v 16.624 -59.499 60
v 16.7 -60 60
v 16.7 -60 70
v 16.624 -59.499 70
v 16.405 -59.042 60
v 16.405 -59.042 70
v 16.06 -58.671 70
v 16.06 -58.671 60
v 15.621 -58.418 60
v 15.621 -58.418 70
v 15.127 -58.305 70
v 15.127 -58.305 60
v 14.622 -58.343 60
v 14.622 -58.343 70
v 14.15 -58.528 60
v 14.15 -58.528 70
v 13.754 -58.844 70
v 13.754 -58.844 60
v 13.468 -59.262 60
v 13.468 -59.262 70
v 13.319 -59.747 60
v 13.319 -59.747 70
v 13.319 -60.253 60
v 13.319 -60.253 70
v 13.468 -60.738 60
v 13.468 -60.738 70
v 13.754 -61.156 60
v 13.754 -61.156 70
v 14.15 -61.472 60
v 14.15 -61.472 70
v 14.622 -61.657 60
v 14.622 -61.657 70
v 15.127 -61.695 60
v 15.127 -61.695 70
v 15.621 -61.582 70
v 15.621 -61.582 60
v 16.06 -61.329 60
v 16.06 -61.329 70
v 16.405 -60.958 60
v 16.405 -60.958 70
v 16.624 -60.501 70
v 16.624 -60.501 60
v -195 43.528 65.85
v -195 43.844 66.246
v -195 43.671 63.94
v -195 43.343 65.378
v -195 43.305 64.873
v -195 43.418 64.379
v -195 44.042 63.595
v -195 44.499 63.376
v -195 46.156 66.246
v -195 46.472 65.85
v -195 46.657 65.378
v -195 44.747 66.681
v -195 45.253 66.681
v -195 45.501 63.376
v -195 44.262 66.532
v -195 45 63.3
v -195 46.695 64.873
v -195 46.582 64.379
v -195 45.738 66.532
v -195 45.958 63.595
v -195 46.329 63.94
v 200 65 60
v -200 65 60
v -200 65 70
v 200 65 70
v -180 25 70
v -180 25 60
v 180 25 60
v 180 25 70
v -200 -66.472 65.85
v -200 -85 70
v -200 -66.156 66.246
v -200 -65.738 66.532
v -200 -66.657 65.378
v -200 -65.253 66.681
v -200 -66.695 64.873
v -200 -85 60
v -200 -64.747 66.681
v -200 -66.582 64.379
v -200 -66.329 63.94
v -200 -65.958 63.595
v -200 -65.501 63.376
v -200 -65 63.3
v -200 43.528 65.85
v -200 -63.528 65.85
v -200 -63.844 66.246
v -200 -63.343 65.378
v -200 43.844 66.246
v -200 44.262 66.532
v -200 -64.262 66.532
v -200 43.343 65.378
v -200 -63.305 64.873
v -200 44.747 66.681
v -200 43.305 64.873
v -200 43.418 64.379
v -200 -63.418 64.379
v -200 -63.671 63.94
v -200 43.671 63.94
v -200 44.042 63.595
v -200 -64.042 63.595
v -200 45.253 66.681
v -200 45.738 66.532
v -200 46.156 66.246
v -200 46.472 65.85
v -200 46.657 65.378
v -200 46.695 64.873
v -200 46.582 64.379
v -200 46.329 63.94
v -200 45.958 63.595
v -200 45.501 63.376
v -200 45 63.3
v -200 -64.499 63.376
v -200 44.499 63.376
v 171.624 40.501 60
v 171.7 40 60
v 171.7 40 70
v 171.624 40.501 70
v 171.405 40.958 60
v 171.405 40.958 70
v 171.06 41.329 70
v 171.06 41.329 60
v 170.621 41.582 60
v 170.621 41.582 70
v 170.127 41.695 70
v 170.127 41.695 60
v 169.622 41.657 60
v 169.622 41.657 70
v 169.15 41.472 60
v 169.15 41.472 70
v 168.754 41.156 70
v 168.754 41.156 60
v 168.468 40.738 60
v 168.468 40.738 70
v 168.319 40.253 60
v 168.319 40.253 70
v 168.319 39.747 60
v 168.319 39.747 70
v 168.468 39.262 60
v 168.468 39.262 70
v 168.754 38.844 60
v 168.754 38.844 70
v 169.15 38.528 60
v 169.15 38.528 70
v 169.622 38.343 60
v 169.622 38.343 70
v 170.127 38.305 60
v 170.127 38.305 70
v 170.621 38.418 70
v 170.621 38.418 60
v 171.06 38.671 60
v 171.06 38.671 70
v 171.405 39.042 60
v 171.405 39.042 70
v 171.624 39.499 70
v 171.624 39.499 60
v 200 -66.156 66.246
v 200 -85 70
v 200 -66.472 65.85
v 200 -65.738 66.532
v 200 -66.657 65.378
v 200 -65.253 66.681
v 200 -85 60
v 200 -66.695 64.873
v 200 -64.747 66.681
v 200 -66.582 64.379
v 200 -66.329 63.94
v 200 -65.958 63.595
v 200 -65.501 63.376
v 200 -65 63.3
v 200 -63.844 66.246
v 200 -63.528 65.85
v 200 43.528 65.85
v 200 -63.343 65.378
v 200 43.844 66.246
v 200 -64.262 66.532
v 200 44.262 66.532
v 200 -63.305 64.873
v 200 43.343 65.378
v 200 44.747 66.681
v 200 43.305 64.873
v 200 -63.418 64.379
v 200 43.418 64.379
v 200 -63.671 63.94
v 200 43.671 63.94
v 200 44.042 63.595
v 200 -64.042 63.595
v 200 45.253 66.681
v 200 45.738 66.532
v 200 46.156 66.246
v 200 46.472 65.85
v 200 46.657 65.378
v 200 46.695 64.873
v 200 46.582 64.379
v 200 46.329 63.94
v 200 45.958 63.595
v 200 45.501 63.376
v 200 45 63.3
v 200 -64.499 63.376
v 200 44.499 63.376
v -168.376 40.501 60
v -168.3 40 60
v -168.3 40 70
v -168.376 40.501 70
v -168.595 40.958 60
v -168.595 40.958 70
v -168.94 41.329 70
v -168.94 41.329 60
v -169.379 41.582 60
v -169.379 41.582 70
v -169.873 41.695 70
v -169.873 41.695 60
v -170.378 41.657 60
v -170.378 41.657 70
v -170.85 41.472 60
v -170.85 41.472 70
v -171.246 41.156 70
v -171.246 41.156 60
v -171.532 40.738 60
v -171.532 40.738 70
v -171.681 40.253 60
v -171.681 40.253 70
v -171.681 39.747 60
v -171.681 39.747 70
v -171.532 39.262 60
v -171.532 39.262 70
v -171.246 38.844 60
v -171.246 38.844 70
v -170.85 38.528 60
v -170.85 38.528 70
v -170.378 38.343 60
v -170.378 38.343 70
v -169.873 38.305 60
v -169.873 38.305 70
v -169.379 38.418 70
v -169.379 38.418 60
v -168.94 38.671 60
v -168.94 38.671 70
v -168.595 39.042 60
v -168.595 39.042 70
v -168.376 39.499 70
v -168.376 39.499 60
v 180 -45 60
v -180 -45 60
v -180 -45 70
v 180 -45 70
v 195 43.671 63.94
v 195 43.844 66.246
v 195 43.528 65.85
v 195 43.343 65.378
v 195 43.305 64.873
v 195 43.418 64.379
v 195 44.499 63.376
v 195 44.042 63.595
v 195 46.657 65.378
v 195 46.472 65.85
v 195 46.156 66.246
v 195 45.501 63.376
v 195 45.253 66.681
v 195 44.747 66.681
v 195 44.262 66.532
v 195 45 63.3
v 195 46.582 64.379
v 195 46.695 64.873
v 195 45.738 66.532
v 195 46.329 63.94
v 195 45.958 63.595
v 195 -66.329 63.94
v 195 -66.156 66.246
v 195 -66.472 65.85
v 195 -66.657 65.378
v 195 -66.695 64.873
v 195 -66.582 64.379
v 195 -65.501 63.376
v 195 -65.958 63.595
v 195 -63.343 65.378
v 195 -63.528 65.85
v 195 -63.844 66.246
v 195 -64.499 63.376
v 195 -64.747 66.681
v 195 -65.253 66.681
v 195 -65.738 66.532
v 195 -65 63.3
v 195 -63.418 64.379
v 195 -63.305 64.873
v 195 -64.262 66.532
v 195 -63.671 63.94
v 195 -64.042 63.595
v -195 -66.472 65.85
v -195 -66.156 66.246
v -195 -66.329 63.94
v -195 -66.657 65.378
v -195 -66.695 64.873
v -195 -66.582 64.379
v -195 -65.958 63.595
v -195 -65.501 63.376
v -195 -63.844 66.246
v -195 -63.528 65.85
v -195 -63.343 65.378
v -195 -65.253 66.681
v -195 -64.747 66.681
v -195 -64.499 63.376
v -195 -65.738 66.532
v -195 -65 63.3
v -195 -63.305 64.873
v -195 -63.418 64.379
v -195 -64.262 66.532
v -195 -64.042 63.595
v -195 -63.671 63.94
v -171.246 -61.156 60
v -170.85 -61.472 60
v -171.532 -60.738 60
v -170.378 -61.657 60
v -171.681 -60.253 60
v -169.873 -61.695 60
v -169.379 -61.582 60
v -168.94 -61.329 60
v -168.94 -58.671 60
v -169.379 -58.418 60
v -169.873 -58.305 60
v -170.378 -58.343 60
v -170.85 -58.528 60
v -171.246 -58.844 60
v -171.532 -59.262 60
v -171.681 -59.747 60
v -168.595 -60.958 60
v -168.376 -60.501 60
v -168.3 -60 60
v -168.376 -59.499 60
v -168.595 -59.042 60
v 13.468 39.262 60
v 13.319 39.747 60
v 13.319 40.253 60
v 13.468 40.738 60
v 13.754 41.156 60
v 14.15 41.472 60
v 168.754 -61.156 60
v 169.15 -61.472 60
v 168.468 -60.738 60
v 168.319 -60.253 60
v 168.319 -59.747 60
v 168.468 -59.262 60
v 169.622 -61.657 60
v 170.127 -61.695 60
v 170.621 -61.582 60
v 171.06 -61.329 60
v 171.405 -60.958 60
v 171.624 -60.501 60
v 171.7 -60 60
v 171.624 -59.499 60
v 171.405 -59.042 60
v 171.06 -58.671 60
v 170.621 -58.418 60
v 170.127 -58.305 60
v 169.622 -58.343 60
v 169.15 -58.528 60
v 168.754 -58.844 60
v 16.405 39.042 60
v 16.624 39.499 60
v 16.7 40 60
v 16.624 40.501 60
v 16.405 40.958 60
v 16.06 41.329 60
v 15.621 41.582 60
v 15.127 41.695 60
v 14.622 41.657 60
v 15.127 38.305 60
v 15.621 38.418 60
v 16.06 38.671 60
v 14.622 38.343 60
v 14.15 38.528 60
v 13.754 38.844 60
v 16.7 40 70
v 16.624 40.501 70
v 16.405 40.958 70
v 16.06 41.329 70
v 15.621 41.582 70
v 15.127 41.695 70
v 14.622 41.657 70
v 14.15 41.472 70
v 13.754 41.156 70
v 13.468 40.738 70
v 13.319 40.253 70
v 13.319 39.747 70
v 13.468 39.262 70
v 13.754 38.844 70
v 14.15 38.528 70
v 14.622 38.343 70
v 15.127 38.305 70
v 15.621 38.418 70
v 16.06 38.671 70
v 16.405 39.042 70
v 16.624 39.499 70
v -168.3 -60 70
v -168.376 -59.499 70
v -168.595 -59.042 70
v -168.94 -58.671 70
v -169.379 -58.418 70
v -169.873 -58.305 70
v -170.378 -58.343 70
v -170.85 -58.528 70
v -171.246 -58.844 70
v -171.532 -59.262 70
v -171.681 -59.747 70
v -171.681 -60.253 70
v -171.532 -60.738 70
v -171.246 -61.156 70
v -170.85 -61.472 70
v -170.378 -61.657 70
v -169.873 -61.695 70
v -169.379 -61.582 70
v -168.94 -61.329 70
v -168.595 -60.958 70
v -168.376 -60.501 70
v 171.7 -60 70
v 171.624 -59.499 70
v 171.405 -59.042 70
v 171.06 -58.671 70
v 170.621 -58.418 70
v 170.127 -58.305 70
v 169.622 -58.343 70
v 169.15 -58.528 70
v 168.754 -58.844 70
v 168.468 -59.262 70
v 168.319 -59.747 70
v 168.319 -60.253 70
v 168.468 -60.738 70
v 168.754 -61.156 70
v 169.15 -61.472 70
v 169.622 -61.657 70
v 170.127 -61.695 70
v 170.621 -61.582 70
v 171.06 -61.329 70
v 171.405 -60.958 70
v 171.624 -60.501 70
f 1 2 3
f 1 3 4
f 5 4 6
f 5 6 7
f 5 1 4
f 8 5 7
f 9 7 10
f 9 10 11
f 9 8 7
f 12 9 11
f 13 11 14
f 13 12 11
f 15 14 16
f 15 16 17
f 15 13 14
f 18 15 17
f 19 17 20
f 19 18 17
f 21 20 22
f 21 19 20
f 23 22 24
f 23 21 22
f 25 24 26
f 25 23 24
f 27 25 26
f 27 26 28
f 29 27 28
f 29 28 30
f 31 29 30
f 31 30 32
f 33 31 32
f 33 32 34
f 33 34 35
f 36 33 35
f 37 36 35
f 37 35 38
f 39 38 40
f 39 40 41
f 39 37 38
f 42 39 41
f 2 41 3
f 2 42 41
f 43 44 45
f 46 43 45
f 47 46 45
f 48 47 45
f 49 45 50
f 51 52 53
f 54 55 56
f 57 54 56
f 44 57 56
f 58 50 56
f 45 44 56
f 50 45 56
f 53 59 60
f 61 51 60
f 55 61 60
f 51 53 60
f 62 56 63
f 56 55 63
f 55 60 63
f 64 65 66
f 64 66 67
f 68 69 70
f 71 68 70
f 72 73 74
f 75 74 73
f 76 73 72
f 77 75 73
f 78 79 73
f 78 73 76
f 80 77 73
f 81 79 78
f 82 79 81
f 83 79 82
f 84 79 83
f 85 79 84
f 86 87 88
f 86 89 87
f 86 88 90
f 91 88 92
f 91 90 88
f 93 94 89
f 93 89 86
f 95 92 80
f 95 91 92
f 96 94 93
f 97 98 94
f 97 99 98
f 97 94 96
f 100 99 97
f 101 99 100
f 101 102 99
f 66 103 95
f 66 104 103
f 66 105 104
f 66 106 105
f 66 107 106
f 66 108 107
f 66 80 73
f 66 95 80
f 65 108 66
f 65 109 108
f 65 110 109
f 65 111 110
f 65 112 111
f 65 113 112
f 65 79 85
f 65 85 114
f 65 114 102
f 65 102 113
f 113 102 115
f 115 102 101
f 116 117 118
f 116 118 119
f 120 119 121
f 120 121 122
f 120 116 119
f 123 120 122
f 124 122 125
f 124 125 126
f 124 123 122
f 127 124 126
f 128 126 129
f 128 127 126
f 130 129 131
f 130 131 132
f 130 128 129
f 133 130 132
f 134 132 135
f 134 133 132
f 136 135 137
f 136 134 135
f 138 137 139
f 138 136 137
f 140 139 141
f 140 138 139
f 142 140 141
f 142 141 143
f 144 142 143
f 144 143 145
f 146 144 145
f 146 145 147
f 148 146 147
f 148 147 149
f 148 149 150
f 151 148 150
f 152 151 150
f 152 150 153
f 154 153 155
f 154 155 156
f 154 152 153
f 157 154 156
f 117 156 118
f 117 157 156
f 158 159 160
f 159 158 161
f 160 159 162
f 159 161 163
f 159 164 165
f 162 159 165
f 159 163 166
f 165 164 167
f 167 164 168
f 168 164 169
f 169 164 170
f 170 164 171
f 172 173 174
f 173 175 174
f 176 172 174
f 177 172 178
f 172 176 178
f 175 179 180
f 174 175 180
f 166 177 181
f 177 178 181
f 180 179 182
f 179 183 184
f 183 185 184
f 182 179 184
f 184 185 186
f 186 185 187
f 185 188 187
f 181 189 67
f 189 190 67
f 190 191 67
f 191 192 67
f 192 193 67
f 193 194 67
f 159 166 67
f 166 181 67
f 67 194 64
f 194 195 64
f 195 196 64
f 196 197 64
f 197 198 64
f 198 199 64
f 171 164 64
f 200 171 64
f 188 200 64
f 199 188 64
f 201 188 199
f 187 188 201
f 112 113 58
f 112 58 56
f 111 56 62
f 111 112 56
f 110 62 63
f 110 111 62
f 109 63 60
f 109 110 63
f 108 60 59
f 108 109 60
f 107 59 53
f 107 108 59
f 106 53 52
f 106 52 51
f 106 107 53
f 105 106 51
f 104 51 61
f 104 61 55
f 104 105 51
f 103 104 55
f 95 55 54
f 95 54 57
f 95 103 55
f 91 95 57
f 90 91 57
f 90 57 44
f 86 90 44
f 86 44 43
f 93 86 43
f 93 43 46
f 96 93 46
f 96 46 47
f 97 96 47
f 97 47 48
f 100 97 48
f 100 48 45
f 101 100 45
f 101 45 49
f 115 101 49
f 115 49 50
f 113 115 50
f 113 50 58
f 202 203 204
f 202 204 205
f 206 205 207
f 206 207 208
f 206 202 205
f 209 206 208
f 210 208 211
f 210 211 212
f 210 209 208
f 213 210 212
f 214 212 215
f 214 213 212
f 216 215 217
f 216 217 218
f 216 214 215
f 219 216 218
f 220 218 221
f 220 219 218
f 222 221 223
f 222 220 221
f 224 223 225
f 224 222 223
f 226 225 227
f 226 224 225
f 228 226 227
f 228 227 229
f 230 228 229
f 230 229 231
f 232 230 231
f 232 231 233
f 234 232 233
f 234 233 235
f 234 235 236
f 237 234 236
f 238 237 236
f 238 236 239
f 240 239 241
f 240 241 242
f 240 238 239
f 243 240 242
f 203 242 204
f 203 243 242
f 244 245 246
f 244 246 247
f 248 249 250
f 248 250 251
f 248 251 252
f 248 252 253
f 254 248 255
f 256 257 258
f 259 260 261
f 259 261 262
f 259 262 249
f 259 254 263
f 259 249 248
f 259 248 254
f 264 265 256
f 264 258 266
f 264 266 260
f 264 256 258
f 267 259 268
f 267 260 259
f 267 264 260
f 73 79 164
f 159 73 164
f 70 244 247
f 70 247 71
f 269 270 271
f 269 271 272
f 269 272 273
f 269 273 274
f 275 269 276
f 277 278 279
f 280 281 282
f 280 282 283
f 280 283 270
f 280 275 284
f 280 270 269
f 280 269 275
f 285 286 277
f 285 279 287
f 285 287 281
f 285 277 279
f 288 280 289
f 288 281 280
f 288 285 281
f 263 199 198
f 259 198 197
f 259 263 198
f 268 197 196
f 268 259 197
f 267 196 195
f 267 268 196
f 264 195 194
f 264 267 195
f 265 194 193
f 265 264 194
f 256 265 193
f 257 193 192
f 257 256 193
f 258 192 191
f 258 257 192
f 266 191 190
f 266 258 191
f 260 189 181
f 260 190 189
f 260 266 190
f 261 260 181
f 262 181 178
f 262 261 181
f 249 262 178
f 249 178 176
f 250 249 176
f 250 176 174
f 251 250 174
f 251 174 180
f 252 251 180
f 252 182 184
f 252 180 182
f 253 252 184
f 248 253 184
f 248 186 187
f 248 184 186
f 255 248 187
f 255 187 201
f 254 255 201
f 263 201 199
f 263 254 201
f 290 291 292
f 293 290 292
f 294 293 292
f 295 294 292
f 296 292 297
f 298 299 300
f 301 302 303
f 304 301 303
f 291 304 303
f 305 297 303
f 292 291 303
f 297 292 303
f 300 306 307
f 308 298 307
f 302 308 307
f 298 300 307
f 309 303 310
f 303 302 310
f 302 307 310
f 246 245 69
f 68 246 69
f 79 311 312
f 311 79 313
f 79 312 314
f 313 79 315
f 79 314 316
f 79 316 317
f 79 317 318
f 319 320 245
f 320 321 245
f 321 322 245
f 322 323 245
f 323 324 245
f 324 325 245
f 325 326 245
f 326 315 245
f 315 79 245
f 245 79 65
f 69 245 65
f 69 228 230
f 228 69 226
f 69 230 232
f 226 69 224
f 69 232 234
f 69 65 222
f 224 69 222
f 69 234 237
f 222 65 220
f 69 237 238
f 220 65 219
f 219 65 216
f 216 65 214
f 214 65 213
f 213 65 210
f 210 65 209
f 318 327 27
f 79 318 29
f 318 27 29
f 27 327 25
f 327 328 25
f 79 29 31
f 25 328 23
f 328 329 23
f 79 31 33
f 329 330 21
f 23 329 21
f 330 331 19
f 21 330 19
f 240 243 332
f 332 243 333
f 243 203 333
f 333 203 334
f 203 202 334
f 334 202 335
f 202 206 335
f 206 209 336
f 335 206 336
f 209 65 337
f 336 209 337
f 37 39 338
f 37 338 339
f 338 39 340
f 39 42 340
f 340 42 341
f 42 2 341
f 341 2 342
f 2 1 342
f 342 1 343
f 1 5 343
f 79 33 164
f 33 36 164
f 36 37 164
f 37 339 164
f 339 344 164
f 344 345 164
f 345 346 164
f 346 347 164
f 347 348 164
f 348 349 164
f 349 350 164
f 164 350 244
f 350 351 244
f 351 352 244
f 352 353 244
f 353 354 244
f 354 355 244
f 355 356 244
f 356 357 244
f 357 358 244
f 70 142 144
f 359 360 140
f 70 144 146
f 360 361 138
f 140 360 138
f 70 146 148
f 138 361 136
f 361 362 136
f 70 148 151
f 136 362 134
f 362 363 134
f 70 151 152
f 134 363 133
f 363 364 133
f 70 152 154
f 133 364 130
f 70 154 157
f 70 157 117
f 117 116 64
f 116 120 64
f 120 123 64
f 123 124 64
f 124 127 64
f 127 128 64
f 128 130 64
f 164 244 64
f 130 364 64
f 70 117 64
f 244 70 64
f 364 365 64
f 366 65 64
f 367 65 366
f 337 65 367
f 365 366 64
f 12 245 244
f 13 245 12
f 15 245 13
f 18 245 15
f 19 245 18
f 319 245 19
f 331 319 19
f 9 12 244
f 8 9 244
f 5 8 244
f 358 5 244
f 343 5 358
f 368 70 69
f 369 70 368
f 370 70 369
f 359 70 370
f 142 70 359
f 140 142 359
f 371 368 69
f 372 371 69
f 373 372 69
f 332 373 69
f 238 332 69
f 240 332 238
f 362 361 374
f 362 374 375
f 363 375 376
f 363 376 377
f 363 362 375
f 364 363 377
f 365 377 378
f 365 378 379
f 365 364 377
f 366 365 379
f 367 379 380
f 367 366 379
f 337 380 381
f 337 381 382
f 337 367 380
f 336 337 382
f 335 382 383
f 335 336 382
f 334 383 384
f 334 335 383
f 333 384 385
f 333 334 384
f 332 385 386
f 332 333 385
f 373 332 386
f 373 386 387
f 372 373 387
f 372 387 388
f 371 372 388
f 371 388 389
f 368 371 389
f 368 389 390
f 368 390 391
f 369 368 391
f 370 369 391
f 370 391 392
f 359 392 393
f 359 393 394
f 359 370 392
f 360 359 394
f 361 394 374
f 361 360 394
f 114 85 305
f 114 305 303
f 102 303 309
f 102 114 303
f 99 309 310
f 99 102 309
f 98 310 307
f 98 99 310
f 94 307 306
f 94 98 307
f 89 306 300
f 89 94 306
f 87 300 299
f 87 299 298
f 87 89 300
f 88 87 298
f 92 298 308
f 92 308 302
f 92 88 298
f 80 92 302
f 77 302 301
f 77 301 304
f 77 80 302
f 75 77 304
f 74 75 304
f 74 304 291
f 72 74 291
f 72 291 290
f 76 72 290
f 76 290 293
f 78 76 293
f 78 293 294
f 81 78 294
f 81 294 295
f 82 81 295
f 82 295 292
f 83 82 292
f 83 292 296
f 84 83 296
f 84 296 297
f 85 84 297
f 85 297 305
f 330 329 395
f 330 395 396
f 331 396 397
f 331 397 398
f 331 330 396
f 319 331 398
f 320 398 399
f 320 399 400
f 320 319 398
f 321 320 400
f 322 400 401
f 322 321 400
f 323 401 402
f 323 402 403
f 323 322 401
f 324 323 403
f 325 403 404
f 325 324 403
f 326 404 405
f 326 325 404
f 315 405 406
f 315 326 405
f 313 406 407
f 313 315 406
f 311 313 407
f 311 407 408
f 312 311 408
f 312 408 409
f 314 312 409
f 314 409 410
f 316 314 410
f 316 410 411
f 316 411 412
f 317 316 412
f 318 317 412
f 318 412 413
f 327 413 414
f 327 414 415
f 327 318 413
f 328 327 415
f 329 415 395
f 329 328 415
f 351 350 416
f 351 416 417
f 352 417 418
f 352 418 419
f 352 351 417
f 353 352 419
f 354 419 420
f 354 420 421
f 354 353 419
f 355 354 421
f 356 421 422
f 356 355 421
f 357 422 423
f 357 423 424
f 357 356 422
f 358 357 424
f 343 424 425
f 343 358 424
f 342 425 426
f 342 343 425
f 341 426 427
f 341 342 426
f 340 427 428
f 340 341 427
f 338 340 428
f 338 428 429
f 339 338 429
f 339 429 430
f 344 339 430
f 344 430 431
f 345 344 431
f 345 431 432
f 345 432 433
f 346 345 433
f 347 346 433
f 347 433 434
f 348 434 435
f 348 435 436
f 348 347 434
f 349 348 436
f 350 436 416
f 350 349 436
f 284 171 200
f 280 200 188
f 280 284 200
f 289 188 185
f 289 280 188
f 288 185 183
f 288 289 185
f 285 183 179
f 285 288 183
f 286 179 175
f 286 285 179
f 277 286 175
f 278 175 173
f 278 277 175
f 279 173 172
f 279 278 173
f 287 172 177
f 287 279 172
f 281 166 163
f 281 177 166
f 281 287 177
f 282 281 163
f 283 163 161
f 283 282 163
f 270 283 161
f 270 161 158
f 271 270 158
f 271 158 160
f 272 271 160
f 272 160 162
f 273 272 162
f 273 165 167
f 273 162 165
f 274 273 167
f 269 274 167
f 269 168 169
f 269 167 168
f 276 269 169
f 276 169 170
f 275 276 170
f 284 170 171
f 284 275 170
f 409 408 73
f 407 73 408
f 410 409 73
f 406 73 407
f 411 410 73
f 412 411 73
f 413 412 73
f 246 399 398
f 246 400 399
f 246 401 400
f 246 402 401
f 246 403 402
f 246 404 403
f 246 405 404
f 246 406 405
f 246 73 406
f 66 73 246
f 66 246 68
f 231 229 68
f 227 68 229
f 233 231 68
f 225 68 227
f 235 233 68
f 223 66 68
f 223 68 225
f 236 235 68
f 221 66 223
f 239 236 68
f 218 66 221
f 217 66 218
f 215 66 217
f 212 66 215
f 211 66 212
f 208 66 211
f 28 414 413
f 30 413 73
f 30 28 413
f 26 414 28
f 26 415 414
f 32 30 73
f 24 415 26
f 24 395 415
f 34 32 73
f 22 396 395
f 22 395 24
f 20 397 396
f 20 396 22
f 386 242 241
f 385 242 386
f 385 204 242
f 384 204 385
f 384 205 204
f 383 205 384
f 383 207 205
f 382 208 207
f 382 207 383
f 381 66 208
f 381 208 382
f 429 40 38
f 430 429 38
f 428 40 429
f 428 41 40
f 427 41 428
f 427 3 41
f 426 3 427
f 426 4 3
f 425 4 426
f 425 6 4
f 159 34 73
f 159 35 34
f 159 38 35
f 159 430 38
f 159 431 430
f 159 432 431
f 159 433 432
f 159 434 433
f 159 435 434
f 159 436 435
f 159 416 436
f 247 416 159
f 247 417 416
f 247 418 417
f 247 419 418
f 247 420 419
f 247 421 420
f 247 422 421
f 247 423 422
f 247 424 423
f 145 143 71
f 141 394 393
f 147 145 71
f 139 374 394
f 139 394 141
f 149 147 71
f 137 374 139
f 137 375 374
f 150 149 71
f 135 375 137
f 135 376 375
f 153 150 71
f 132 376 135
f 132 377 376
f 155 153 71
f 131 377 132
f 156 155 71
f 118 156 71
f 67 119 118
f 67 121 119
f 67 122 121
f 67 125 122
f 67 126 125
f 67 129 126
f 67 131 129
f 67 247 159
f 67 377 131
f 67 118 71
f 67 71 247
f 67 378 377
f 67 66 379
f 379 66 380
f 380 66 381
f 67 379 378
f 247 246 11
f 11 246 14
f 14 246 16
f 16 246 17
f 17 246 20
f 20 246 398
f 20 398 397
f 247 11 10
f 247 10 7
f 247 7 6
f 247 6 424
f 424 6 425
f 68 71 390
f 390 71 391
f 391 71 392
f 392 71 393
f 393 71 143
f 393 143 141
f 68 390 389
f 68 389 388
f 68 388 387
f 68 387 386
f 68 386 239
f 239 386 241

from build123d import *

# Parameters (mm, degrees)
CYLINDER013_R           = 1.7
CYLINDER013_DEPTH       = 20
CYLINDER013_PITCH_ANGLE = 90
CYLINDER015_R           = 1.7
CYLINDER015_DEPTH       = 20
CYLINDER015_PITCH_ANGLE = 90
CYLINDER016_R           = 1.7
CYLINDER016_DEPTH       = 20
CYLINDER016_PITCH_ANGLE = 90
CYLINDER017_R           = 1.7
CYLINDER017_DEPTH       = 20
CYLINDER017_PITCH_ANGLE = 90
SKETCH013_W             = 400
SKETCH013_H             = 150
SKETCH013_R             = 1.7
SKETCH013_W_2           = 360
SKETCH013_H_2           = 70
PAD013_DEPTH            = 10


with BuildPart() as cylinder013:
    # Cylinder013 → Cylinder013 (new body)
    with BuildSketch(Plane.XY):
        Circle(CYLINDER013_R)
    extrude(amount=CYLINDER013_DEPTH)


with BuildPart() as cylinder013_1:
    # Cylinder013 pitch: moved
    add(cylinder013.part.rotate(Axis((0, 0, 0), (0, 1, 0)), CYLINDER013_PITCH_ANGLE))


with BuildPart() as cylinder013_2:
    # Cylinder013 placement: moved
    add(cylinder013_1.part.moved(Location((195, -65, 65))))


with BuildPart() as cylinder015:
    # Cylinder015 → Cylinder015 (new body)
    with BuildSketch(Plane.XY):
        Circle(CYLINDER015_R)
    extrude(amount=CYLINDER015_DEPTH)


with BuildPart() as cylinder015_1:
    # Cylinder015 pitch: moved
    add(cylinder015.part.rotate(Axis((0, 0, 0), (0, 1, 0)), CYLINDER015_PITCH_ANGLE))


with BuildPart() as cylinder015_2:
    # Cylinder015 placement: moved
    add(cylinder015_1.part.moved(Location((-215, -65, 65))))


with BuildPart() as cylinder016:
    # Cylinder016 → Cylinder016 (new body)
    with BuildSketch(Plane.XY):
        Circle(CYLINDER016_R)
    extrude(amount=CYLINDER016_DEPTH)


with BuildPart() as cylinder016_1:
    # Cylinder016 pitch: moved
    add(cylinder016.part.rotate(Axis((0, 0, 0), (0, 1, 0)), CYLINDER016_PITCH_ANGLE))


with BuildPart() as cylinder016_2:
    # Cylinder016 placement: moved
    add(cylinder016_1.part.moved(Location((-215, 45, 65))))


with BuildPart() as fusion004:
    # Cylinder017 → Cylinder017 (new body)
    with BuildSketch(Plane.XY):
        Circle(CYLINDER017_R)
    extrude(amount=CYLINDER017_DEPTH)


with BuildPart() as fusion004_1:
    # Cylinder017 pitch: moved
    add(fusion004.part.rotate(Axis((0, 0, 0), (0, 1, 0)), CYLINDER017_PITCH_ANGLE))


with BuildPart() as fusion004_2:
    # Cylinder017 placement: moved
    add(fusion004_1.part.moved(Location((195, 45, 65))))

    # Fusion004: union Cylinder013, Cylinder015, Cylinder016
    add(cylinder013_2.part)
    add(cylinder015_2.part)
    add(cylinder016_2.part)


with BuildPart() as cut016:
    # Sketch013 → Pad013 (new body)
    with BuildSketch(Plane(origin=(0, -10, 60), x_dir=(1, 0, 0), z_dir=(0, 0, 1))):
        Rectangle(SKETCH013_W, SKETCH013_H)
        with Locations((-170, 50)):
            Circle(SKETCH013_R, mode=Mode.SUBTRACT)
        with Locations((-170, -50)):
            Circle(SKETCH013_R, mode=Mode.SUBTRACT)
        with Locations((15, -50)):
            Circle(SKETCH013_R, mode=Mode.SUBTRACT)
        with Locations((170, -50)):
            Circle(SKETCH013_R, mode=Mode.SUBTRACT)
        with Locations((170, 50)):
            Circle(SKETCH013_R, mode=Mode.SUBTRACT)
        with Locations((15, 50)):
            Circle(SKETCH013_R, mode=Mode.SUBTRACT)
        Rectangle(SKETCH013_W_2, SKETCH013_H_2, mode=Mode.SUBTRACT)
    extrude(amount=PAD013_DEPTH)

    # Cut016: cut Fusion004
    add(fusion004_2.part, mode=Mode.SUBTRACT)


solid = cut016.part
